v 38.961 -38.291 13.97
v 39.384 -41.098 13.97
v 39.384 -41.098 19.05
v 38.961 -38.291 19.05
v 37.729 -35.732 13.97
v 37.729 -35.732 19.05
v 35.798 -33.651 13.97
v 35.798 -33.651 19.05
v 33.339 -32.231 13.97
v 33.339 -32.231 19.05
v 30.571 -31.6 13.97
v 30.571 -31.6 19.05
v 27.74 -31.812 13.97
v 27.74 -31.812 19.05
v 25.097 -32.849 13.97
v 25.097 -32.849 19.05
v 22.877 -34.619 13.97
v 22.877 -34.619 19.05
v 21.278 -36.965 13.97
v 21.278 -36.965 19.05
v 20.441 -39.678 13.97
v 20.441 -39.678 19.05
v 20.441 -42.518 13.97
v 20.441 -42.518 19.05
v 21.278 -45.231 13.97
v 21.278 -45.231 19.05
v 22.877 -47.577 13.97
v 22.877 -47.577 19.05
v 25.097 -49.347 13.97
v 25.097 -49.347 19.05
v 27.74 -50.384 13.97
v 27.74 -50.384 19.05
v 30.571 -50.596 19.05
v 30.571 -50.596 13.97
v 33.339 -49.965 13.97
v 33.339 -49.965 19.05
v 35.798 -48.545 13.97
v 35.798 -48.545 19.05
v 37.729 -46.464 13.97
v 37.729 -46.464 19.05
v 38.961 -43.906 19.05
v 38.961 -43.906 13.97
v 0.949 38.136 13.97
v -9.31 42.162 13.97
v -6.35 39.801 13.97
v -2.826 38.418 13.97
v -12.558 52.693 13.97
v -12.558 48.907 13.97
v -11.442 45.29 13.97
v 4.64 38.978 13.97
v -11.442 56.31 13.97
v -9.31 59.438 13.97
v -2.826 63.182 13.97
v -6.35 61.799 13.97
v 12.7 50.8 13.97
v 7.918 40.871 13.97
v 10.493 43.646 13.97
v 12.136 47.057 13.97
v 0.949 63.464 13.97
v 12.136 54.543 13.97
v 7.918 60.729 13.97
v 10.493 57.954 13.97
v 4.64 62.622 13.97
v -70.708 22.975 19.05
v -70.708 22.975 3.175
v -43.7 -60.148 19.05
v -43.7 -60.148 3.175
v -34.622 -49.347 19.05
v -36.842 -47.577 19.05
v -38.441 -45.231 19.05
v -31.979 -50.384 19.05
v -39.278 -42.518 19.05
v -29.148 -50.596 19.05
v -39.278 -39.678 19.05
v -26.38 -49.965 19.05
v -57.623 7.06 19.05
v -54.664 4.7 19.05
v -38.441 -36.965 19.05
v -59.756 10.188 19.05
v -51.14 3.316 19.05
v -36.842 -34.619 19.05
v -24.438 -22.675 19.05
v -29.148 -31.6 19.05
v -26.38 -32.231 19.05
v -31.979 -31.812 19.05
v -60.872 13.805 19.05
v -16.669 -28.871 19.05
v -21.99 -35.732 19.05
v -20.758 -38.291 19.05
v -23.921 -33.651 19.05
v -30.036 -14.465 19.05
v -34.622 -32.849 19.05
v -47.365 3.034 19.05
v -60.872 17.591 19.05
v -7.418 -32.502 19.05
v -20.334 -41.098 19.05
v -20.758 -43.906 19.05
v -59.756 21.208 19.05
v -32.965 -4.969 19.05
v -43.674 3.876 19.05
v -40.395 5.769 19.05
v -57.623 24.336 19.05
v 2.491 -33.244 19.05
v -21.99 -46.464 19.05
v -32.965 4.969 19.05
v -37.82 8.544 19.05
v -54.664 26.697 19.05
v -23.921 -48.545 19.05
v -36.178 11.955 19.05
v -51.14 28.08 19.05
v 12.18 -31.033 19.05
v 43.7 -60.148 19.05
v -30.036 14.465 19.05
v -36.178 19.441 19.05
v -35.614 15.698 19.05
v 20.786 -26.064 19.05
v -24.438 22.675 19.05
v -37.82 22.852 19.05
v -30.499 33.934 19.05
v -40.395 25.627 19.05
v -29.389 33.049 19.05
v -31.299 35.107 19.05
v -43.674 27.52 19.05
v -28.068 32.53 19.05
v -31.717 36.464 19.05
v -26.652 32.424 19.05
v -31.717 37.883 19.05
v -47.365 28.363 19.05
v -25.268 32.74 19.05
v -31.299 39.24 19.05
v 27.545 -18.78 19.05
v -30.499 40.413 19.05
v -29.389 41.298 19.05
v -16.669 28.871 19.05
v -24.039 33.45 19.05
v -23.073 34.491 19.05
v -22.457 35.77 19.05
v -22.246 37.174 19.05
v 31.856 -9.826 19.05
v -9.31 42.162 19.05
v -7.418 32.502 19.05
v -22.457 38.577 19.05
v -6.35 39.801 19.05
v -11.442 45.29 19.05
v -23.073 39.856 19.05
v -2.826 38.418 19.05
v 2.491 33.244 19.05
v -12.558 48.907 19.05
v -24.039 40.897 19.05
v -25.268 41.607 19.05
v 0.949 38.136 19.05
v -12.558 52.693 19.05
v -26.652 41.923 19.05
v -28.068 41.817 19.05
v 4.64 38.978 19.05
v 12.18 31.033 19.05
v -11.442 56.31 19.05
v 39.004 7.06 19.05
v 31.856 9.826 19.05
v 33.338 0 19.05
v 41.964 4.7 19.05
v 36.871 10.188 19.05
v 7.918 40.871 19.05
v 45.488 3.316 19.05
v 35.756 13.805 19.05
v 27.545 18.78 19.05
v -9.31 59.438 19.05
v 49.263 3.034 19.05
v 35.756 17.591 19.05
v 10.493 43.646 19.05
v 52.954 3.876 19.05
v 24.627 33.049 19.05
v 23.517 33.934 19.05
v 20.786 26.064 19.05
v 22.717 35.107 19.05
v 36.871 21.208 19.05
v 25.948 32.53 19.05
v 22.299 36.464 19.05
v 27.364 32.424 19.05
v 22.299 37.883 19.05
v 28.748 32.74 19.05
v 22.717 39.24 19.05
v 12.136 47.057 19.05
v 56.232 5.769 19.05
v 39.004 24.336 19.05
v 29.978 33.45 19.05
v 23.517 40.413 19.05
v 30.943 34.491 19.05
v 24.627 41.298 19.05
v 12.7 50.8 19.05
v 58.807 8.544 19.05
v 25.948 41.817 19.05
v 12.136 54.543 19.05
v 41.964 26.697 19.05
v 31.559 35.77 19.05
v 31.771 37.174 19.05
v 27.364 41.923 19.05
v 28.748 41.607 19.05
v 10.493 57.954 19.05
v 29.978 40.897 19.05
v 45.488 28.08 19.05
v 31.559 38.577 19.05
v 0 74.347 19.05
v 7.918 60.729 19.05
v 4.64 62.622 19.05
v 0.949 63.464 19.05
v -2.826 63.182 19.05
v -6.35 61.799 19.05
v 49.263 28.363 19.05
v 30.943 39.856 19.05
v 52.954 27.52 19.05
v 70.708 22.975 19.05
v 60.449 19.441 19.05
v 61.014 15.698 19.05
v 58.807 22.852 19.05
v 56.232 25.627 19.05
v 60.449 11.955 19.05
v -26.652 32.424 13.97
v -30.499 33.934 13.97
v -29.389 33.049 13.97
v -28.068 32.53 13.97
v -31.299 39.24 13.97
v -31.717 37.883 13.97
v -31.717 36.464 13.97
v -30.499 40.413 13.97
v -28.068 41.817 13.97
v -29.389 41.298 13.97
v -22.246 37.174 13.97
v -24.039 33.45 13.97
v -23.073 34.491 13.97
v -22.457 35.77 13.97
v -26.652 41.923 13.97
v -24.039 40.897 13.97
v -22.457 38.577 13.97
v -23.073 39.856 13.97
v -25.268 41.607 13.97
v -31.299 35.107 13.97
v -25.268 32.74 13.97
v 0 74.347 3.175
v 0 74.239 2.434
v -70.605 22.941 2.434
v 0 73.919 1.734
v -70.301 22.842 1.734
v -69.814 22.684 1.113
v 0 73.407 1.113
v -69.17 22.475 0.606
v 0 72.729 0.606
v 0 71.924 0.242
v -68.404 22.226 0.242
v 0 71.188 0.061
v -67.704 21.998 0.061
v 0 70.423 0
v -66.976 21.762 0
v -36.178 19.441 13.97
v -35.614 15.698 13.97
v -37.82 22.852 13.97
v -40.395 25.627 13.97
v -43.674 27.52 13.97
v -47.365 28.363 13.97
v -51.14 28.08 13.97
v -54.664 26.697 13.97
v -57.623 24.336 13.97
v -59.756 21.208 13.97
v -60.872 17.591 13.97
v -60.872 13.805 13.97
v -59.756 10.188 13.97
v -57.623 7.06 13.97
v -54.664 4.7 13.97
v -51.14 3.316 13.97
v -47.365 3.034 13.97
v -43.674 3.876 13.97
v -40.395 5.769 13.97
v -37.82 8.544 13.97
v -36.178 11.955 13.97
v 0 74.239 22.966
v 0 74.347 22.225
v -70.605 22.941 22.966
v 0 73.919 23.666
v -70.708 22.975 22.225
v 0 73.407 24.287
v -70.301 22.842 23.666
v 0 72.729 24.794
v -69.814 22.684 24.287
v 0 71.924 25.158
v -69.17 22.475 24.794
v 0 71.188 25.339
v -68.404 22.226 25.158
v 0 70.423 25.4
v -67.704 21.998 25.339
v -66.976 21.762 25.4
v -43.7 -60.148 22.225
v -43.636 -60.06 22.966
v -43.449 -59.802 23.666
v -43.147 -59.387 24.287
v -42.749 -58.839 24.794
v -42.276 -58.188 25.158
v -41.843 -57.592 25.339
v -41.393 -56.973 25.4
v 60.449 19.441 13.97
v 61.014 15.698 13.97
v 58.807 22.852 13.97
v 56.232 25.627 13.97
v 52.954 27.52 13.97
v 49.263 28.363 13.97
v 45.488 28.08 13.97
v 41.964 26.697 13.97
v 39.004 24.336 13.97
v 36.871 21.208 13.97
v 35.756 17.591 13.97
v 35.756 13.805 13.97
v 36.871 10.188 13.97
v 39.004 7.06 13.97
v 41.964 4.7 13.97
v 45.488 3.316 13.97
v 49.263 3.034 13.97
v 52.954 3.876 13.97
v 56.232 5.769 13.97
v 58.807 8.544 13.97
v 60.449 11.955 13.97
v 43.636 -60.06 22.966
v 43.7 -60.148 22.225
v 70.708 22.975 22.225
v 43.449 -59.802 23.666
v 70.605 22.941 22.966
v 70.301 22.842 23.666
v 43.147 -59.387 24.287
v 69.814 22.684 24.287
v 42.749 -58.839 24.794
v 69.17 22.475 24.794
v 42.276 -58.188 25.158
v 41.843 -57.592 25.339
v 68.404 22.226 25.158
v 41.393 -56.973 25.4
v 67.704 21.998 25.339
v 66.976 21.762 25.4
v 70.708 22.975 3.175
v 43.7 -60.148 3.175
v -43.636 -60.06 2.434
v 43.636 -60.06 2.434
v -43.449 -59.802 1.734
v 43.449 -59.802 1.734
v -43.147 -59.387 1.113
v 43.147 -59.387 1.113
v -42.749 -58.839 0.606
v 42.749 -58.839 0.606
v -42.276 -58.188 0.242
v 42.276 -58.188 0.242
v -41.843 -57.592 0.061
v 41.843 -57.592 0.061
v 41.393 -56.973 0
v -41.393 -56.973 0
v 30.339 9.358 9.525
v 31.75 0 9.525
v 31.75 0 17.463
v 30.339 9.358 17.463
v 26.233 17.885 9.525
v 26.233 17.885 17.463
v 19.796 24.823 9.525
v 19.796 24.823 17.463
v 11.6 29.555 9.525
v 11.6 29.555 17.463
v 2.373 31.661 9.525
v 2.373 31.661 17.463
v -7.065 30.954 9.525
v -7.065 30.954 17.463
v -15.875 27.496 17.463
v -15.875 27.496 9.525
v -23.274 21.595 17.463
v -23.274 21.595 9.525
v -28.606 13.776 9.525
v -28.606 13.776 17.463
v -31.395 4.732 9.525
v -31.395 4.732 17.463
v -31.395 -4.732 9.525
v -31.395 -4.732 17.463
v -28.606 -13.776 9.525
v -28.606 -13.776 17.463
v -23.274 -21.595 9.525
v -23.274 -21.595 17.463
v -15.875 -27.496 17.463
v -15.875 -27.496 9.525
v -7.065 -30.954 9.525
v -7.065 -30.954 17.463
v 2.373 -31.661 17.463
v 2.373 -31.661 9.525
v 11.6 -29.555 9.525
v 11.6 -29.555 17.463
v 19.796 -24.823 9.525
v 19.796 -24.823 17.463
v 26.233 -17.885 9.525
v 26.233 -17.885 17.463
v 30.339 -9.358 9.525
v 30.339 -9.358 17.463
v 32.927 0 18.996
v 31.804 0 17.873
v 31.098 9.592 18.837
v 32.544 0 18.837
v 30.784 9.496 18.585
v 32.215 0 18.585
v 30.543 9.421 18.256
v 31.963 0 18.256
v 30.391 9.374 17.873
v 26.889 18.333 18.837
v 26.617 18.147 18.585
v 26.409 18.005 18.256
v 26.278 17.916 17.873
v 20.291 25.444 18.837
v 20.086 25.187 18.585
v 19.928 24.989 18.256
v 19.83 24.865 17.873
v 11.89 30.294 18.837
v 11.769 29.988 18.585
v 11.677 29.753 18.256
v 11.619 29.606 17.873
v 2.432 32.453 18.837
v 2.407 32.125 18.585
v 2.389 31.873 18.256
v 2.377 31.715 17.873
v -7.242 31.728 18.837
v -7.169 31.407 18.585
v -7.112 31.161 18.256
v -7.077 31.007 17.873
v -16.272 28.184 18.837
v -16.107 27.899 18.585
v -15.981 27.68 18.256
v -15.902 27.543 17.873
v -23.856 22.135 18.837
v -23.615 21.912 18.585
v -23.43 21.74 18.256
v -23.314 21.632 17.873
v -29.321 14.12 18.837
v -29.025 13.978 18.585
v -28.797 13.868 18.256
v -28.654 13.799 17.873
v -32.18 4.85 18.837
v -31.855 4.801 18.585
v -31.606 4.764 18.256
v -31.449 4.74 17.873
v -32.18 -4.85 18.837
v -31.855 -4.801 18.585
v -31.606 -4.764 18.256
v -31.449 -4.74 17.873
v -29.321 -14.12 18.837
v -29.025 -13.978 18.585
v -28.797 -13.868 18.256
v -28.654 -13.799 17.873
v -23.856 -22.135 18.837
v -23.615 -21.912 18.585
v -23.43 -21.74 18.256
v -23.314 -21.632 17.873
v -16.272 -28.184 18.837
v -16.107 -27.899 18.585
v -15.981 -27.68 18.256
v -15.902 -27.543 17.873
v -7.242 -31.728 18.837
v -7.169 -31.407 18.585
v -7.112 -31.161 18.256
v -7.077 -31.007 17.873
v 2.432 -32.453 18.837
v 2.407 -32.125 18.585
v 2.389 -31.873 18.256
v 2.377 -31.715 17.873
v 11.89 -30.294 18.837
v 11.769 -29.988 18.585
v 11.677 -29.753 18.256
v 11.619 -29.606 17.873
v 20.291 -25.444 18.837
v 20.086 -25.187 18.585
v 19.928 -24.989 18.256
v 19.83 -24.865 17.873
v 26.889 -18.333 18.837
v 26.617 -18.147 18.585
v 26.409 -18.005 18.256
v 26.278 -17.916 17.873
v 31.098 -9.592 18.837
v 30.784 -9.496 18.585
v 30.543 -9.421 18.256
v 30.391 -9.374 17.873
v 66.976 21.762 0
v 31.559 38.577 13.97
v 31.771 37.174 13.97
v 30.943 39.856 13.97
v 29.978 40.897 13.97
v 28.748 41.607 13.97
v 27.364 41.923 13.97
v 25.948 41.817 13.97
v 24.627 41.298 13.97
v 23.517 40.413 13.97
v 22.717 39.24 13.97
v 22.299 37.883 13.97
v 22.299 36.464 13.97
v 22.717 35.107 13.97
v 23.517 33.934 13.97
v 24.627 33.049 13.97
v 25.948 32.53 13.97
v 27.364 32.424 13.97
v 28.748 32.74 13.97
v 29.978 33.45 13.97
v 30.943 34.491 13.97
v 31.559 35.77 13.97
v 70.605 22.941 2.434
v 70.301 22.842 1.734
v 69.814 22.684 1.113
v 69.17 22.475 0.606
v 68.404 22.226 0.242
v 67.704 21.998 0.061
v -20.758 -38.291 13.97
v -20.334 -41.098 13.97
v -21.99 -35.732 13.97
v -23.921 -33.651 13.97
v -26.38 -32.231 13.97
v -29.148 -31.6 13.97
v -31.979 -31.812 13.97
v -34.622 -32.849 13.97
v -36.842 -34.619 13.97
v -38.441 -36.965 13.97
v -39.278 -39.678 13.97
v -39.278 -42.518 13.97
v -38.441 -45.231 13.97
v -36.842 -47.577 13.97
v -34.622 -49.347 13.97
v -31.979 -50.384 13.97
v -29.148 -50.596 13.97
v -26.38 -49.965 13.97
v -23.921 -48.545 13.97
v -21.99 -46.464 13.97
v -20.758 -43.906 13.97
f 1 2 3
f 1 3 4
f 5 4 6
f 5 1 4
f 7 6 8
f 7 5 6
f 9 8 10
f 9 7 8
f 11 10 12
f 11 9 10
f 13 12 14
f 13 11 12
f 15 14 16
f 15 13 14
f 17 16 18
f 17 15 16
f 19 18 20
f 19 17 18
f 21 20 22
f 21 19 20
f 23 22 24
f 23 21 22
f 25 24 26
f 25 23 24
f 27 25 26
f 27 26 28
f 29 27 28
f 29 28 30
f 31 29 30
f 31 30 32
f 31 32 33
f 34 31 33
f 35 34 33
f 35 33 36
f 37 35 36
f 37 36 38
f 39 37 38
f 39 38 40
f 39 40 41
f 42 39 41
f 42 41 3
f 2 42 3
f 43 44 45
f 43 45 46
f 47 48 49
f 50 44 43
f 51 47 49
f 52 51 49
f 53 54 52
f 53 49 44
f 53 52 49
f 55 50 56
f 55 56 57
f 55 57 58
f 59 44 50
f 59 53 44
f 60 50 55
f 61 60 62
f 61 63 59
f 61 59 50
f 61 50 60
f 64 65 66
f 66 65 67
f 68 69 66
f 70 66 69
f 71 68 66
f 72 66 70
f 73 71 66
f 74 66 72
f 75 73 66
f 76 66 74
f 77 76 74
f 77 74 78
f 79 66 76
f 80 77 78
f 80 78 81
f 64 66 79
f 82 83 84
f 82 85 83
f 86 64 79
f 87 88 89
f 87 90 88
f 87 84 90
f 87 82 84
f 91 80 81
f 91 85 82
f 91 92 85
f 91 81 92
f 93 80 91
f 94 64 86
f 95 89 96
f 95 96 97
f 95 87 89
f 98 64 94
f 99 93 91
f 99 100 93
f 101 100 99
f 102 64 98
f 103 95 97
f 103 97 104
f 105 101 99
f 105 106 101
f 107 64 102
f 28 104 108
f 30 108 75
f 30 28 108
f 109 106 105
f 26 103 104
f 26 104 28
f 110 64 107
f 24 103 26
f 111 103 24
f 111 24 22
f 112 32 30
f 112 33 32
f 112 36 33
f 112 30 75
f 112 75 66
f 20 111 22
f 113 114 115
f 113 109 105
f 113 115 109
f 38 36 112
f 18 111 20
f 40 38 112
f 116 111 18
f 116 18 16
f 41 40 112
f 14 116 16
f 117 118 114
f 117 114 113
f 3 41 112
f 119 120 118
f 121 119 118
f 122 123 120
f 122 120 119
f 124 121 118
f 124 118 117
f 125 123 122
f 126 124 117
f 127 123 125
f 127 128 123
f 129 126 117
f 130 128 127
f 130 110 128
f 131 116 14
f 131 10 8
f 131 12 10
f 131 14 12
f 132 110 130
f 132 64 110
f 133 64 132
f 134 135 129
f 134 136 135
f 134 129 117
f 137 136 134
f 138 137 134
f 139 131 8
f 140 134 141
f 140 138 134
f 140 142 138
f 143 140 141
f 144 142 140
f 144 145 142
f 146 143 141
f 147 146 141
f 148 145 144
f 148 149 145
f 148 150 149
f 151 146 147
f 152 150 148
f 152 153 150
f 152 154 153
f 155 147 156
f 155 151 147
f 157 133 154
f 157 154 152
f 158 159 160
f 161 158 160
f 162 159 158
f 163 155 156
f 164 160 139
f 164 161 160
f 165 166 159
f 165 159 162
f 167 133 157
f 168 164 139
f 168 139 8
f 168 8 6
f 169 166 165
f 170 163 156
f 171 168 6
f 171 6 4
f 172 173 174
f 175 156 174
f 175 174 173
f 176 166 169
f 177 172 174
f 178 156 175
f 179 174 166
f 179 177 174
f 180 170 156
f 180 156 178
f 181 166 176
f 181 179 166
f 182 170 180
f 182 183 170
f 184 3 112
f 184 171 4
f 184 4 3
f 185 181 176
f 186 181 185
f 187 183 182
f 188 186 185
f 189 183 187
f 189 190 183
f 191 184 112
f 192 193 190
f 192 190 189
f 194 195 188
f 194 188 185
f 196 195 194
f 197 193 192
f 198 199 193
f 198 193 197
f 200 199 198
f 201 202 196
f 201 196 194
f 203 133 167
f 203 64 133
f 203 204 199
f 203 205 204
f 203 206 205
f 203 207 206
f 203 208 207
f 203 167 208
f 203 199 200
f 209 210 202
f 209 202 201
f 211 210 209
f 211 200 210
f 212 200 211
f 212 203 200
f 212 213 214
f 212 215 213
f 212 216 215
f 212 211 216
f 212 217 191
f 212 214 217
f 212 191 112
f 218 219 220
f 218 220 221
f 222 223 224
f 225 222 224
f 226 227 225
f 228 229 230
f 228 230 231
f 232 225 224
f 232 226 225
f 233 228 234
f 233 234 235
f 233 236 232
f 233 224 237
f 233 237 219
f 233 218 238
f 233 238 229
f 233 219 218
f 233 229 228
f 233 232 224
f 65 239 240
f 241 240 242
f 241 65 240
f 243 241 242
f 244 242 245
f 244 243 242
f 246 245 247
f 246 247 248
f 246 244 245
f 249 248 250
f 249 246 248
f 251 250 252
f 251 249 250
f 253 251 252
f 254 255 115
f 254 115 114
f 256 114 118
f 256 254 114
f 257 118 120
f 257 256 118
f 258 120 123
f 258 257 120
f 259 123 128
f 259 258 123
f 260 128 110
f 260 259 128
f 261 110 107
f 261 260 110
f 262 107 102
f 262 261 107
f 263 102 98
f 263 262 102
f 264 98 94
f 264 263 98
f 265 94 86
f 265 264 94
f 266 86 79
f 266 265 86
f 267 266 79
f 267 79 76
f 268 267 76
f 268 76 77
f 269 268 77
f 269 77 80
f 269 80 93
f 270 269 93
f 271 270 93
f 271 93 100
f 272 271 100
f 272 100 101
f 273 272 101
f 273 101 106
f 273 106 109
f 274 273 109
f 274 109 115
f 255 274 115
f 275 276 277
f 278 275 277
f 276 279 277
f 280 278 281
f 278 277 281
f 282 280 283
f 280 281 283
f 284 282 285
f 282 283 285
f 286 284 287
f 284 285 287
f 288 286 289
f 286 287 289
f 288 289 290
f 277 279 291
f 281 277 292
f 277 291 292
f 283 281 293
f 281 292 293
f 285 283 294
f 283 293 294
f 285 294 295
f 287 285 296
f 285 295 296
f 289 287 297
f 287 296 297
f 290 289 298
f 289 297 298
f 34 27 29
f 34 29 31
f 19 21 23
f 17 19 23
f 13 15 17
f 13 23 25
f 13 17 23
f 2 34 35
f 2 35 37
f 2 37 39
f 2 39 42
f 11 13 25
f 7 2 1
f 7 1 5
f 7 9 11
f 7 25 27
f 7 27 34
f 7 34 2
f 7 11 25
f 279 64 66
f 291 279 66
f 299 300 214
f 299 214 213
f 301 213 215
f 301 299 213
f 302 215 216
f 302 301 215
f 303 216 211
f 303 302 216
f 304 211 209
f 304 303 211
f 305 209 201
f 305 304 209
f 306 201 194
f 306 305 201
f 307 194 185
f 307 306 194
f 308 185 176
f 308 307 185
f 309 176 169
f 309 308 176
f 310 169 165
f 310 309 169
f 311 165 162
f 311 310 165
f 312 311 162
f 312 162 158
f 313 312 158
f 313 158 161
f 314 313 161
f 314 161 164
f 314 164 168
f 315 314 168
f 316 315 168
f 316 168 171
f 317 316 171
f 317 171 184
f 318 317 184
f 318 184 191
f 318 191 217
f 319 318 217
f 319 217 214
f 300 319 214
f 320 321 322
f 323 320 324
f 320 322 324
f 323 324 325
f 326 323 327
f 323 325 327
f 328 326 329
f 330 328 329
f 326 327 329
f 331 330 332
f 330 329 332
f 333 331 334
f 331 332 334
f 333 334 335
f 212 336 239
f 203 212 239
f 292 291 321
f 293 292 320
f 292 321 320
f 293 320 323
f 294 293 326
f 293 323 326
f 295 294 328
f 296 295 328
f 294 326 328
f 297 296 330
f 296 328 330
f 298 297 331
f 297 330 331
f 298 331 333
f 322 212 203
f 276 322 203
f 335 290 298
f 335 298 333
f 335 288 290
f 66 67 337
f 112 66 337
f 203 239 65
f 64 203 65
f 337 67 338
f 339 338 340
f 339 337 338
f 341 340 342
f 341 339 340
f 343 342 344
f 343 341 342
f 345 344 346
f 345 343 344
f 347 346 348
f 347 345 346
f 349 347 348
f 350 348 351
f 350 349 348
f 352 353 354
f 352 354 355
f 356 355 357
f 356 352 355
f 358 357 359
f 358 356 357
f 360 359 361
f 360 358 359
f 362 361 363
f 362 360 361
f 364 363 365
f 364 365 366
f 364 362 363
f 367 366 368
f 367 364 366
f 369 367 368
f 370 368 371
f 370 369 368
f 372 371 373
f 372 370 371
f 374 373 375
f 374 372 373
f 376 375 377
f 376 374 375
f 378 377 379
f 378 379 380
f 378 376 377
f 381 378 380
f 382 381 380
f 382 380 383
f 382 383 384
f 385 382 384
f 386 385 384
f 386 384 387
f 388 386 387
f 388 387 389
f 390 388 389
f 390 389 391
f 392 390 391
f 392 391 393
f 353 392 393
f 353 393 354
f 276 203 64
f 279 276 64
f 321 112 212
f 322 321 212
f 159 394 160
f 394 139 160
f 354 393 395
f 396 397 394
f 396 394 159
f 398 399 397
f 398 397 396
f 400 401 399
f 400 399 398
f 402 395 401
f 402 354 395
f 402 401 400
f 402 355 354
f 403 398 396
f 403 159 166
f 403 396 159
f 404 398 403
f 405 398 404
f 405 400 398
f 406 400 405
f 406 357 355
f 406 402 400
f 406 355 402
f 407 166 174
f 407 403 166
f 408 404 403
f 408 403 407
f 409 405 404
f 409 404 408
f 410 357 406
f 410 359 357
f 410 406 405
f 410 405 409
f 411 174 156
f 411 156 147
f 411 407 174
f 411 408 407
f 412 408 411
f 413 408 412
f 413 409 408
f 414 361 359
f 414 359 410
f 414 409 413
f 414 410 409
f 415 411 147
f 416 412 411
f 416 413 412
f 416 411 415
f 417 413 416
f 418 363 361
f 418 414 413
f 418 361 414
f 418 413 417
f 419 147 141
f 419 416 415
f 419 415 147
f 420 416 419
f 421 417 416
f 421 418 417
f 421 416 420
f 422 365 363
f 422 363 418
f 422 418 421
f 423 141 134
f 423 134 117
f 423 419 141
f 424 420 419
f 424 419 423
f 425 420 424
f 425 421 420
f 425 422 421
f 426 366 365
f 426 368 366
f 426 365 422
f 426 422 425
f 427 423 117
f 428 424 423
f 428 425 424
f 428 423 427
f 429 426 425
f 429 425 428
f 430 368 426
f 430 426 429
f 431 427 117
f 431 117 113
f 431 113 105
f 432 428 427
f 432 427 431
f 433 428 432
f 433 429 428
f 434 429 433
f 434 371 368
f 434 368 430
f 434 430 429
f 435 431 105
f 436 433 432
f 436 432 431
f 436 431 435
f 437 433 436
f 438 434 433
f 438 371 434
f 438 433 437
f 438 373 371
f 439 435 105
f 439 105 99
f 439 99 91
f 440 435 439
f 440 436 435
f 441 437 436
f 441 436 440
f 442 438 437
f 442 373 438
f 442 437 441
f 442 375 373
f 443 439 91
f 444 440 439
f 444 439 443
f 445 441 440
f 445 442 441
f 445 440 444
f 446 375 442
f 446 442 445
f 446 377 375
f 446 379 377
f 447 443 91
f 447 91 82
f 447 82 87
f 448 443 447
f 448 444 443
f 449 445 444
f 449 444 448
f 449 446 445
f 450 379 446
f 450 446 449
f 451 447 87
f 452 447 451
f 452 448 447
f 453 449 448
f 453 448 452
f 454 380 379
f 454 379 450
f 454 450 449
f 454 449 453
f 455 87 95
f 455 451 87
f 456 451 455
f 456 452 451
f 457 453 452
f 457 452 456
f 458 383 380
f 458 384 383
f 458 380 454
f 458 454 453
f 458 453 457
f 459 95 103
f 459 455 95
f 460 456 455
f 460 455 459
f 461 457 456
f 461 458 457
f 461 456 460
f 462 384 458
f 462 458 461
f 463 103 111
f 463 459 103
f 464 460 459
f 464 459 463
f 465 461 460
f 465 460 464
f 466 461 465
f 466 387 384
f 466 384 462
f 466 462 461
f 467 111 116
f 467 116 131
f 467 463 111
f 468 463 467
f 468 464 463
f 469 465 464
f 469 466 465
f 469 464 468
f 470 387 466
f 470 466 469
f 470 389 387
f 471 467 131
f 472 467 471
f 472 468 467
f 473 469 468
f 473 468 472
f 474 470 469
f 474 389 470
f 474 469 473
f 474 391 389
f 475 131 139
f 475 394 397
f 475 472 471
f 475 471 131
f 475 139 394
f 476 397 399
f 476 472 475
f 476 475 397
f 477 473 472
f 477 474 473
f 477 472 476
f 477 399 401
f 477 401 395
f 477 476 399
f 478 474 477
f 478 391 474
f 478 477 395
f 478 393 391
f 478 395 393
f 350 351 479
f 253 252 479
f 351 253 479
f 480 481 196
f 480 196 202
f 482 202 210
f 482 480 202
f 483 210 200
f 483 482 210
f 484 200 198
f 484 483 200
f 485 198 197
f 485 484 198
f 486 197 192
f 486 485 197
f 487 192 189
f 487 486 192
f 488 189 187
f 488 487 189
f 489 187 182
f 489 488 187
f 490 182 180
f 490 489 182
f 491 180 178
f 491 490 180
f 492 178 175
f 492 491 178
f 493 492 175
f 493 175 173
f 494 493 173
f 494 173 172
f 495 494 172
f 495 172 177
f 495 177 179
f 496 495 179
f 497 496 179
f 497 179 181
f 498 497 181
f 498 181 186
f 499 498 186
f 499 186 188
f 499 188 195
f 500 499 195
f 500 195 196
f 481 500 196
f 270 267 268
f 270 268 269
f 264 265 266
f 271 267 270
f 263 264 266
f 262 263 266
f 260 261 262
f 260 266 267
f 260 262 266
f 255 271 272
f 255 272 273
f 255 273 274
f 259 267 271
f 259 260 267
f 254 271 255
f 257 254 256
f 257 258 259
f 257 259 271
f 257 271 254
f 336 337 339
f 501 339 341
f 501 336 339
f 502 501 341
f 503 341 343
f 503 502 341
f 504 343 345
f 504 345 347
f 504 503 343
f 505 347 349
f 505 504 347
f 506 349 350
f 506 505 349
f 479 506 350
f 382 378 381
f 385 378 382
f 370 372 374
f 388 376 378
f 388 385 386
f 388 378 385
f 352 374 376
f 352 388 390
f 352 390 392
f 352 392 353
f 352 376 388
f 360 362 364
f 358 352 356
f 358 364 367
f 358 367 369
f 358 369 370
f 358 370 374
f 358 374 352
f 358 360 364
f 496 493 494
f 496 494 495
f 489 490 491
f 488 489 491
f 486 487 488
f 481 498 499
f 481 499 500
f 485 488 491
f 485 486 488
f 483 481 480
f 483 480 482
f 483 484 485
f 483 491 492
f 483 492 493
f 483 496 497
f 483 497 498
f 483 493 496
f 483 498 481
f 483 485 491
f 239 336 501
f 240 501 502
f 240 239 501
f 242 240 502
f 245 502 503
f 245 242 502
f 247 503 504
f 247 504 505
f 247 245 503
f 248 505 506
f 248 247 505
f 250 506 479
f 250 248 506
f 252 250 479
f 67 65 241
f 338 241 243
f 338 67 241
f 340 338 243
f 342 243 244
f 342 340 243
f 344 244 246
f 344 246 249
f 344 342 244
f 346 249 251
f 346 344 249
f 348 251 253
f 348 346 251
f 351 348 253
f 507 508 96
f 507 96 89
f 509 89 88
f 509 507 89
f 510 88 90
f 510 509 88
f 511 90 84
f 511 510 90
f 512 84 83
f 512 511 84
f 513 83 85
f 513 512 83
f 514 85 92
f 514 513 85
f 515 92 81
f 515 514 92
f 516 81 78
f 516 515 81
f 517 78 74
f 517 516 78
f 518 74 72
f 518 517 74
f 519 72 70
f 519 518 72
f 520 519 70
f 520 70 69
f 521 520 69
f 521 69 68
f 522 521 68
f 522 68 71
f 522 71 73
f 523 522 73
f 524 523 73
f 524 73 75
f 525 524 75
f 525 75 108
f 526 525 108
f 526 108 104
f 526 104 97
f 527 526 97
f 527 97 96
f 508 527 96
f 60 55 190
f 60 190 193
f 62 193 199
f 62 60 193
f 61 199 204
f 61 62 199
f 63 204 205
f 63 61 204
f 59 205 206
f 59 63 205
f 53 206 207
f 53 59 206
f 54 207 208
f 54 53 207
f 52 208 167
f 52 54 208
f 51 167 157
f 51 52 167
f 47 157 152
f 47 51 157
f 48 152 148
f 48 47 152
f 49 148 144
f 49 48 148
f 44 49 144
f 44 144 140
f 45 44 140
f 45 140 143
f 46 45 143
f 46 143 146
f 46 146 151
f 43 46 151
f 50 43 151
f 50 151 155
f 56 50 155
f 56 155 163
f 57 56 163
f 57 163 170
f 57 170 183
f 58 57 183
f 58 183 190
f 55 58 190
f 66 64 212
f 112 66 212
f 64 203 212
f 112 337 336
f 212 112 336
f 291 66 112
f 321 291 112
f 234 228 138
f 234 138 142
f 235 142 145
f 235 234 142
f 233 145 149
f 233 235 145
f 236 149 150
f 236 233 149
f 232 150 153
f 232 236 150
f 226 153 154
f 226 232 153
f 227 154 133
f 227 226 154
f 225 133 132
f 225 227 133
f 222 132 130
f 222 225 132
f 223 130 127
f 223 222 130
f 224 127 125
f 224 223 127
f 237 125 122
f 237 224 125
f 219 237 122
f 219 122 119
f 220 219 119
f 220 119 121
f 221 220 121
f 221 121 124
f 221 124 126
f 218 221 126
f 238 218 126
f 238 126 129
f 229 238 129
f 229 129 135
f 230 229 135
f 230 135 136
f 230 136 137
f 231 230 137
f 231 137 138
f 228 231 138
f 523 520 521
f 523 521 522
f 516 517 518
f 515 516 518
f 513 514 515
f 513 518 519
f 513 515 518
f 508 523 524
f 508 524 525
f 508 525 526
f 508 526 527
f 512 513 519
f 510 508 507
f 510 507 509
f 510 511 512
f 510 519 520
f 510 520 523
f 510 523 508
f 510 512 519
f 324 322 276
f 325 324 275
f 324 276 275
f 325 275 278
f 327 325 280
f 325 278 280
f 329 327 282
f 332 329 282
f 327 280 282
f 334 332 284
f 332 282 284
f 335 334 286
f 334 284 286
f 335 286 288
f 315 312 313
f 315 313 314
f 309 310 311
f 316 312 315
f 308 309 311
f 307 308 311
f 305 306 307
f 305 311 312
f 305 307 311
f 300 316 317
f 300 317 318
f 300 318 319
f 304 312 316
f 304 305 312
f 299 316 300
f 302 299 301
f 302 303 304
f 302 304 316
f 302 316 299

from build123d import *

# Parameters (mm, degrees)
F0_R     = 9.525
F0_R_2   = 31.75
F0_R_3   = 12.7
F0_R_4   = 4.7625
F1_DEPTH = 19.05
F2_DEPTH = 13.97
F3_DEPTH = 9.525
F4_R     = 1.5875
F5_R     = 3.175
F7_DEPTH = 6.35
F8_R     = 3.175


# Not quite as in the source:
# - a feature names something its author has since deleted; it is built from what else it names


with BuildPart() as f1:
    # F0 (on Top) → F1 (new body)
    with BuildSketch(Plane.XY):
        Polygon((-43.700125975, -60.1480633142), (43.700125975, -60.1480633142), (70.7082891401, 22.9745158286), (0, 74.3470949714), (-70.7082891401, 22.9745158286), align=None)
        with Locations((-29.8594908165, -41.0980633142)):
            Circle(F0_R, mode=Mode.SUBTRACT)
        with Locations((29.8594908165, -41.0980633142)):
            Circle(F0_R, mode=Mode.SUBTRACT)
        Circle(F0_R_2, mode=Mode.SUBTRACT)
        with Locations((-48.3136710278, 15.6980633142)):
            Circle(F0_R_3, mode=Mode.SUBTRACT)
        with Locations((-27.0081631652, 37.1735474857)):
            Circle(F0_R_4, mode=Mode.SUBTRACT)
        with Locations((27.0081631652, 37.1735474857)):
            Circle(F0_R_4, mode=Mode.SUBTRACT)
        with Locations((48.3136710278, 15.6980633142)):
            Circle(F0_R_3, mode=Mode.SUBTRACT)
        with Locations((0, 50.8)):
            Circle(F0_R_3, mode=Mode.SUBTRACT)
    extrude(amount=F1_DEPTH)

    # F0 (on Top) → F2 (join)
    with BuildSketch(Plane.XY):
        with Locations((-48.3136710278, 15.6980633142)):
            Circle(F0_R_3)
        with Locations((0, 50.8)):
            Circle(F0_R_3)
        with Locations((48.3136710278, 15.6980633142)):
            Circle(F0_R_3)
        with Locations((29.8594908165, -41.0980633142)):
            Circle(F0_R)
        with Locations((-29.8594908165, -41.0980633142)):
            Circle(F0_R)
        with Locations((-27.0081631652, 37.1735474857)):
            Circle(F0_R_4)
        with Locations((27.0081631652, 37.1735474857)):
            Circle(F0_R_4)
    extrude(amount=F2_DEPTH)

    # F0 (on Top) → F3 (join)
    with BuildSketch(Plane.XY):
        Circle(F0_R_2)
    extrude(amount=F3_DEPTH)

    # F4
    f4_edges = [f1.edges().sort_by_distance(p)[0] for p in [
        (-31.75, 0, 19.05),
    ]]
    fillet(f4_edges, radius=F4_R)

    # F5
    f5_edges = [f1.edges().sort_by_distance(p)[0] for p in [
        (0, -60.148063, 0),
        (57.204208, -18.586774, 0),
        (35.354145, 48.660805, 0),
        (-35.354145, 48.660805, 0),
        (-57.204208, -18.586774, 0),
    ]]
    fillet(f5_edges, radius=F5_R)


with BuildPart() as f7:
    # F6 (on face) → F7 (new body)
    with BuildSketch(Plane.XY.offset(19.05)):
        Polygon((-70.7082891401, 22.9745158286), (-43.700125975, -60.1480633142), (43.700125975, -60.1480633142), (70.7082891401, 22.9745158286), (0, 74.3470949714), align=None)
    extrude(amount=F7_DEPTH)

    # F8
    f8_edges = [f7.edges().sort_by_distance(p)[0] for p in [
        (-57.204208, -18.586774, 25.4),
        (0, -60.148063, 25.4),
        (57.204208, -18.586774, 25.4),
        (35.354145, 48.660805, 25.4),
        (-35.354145, 48.660805, 25.4),
    ]]
    fillet(f8_edges, radius=F8_R)


solid = Compound([f1.part, f7.part])
